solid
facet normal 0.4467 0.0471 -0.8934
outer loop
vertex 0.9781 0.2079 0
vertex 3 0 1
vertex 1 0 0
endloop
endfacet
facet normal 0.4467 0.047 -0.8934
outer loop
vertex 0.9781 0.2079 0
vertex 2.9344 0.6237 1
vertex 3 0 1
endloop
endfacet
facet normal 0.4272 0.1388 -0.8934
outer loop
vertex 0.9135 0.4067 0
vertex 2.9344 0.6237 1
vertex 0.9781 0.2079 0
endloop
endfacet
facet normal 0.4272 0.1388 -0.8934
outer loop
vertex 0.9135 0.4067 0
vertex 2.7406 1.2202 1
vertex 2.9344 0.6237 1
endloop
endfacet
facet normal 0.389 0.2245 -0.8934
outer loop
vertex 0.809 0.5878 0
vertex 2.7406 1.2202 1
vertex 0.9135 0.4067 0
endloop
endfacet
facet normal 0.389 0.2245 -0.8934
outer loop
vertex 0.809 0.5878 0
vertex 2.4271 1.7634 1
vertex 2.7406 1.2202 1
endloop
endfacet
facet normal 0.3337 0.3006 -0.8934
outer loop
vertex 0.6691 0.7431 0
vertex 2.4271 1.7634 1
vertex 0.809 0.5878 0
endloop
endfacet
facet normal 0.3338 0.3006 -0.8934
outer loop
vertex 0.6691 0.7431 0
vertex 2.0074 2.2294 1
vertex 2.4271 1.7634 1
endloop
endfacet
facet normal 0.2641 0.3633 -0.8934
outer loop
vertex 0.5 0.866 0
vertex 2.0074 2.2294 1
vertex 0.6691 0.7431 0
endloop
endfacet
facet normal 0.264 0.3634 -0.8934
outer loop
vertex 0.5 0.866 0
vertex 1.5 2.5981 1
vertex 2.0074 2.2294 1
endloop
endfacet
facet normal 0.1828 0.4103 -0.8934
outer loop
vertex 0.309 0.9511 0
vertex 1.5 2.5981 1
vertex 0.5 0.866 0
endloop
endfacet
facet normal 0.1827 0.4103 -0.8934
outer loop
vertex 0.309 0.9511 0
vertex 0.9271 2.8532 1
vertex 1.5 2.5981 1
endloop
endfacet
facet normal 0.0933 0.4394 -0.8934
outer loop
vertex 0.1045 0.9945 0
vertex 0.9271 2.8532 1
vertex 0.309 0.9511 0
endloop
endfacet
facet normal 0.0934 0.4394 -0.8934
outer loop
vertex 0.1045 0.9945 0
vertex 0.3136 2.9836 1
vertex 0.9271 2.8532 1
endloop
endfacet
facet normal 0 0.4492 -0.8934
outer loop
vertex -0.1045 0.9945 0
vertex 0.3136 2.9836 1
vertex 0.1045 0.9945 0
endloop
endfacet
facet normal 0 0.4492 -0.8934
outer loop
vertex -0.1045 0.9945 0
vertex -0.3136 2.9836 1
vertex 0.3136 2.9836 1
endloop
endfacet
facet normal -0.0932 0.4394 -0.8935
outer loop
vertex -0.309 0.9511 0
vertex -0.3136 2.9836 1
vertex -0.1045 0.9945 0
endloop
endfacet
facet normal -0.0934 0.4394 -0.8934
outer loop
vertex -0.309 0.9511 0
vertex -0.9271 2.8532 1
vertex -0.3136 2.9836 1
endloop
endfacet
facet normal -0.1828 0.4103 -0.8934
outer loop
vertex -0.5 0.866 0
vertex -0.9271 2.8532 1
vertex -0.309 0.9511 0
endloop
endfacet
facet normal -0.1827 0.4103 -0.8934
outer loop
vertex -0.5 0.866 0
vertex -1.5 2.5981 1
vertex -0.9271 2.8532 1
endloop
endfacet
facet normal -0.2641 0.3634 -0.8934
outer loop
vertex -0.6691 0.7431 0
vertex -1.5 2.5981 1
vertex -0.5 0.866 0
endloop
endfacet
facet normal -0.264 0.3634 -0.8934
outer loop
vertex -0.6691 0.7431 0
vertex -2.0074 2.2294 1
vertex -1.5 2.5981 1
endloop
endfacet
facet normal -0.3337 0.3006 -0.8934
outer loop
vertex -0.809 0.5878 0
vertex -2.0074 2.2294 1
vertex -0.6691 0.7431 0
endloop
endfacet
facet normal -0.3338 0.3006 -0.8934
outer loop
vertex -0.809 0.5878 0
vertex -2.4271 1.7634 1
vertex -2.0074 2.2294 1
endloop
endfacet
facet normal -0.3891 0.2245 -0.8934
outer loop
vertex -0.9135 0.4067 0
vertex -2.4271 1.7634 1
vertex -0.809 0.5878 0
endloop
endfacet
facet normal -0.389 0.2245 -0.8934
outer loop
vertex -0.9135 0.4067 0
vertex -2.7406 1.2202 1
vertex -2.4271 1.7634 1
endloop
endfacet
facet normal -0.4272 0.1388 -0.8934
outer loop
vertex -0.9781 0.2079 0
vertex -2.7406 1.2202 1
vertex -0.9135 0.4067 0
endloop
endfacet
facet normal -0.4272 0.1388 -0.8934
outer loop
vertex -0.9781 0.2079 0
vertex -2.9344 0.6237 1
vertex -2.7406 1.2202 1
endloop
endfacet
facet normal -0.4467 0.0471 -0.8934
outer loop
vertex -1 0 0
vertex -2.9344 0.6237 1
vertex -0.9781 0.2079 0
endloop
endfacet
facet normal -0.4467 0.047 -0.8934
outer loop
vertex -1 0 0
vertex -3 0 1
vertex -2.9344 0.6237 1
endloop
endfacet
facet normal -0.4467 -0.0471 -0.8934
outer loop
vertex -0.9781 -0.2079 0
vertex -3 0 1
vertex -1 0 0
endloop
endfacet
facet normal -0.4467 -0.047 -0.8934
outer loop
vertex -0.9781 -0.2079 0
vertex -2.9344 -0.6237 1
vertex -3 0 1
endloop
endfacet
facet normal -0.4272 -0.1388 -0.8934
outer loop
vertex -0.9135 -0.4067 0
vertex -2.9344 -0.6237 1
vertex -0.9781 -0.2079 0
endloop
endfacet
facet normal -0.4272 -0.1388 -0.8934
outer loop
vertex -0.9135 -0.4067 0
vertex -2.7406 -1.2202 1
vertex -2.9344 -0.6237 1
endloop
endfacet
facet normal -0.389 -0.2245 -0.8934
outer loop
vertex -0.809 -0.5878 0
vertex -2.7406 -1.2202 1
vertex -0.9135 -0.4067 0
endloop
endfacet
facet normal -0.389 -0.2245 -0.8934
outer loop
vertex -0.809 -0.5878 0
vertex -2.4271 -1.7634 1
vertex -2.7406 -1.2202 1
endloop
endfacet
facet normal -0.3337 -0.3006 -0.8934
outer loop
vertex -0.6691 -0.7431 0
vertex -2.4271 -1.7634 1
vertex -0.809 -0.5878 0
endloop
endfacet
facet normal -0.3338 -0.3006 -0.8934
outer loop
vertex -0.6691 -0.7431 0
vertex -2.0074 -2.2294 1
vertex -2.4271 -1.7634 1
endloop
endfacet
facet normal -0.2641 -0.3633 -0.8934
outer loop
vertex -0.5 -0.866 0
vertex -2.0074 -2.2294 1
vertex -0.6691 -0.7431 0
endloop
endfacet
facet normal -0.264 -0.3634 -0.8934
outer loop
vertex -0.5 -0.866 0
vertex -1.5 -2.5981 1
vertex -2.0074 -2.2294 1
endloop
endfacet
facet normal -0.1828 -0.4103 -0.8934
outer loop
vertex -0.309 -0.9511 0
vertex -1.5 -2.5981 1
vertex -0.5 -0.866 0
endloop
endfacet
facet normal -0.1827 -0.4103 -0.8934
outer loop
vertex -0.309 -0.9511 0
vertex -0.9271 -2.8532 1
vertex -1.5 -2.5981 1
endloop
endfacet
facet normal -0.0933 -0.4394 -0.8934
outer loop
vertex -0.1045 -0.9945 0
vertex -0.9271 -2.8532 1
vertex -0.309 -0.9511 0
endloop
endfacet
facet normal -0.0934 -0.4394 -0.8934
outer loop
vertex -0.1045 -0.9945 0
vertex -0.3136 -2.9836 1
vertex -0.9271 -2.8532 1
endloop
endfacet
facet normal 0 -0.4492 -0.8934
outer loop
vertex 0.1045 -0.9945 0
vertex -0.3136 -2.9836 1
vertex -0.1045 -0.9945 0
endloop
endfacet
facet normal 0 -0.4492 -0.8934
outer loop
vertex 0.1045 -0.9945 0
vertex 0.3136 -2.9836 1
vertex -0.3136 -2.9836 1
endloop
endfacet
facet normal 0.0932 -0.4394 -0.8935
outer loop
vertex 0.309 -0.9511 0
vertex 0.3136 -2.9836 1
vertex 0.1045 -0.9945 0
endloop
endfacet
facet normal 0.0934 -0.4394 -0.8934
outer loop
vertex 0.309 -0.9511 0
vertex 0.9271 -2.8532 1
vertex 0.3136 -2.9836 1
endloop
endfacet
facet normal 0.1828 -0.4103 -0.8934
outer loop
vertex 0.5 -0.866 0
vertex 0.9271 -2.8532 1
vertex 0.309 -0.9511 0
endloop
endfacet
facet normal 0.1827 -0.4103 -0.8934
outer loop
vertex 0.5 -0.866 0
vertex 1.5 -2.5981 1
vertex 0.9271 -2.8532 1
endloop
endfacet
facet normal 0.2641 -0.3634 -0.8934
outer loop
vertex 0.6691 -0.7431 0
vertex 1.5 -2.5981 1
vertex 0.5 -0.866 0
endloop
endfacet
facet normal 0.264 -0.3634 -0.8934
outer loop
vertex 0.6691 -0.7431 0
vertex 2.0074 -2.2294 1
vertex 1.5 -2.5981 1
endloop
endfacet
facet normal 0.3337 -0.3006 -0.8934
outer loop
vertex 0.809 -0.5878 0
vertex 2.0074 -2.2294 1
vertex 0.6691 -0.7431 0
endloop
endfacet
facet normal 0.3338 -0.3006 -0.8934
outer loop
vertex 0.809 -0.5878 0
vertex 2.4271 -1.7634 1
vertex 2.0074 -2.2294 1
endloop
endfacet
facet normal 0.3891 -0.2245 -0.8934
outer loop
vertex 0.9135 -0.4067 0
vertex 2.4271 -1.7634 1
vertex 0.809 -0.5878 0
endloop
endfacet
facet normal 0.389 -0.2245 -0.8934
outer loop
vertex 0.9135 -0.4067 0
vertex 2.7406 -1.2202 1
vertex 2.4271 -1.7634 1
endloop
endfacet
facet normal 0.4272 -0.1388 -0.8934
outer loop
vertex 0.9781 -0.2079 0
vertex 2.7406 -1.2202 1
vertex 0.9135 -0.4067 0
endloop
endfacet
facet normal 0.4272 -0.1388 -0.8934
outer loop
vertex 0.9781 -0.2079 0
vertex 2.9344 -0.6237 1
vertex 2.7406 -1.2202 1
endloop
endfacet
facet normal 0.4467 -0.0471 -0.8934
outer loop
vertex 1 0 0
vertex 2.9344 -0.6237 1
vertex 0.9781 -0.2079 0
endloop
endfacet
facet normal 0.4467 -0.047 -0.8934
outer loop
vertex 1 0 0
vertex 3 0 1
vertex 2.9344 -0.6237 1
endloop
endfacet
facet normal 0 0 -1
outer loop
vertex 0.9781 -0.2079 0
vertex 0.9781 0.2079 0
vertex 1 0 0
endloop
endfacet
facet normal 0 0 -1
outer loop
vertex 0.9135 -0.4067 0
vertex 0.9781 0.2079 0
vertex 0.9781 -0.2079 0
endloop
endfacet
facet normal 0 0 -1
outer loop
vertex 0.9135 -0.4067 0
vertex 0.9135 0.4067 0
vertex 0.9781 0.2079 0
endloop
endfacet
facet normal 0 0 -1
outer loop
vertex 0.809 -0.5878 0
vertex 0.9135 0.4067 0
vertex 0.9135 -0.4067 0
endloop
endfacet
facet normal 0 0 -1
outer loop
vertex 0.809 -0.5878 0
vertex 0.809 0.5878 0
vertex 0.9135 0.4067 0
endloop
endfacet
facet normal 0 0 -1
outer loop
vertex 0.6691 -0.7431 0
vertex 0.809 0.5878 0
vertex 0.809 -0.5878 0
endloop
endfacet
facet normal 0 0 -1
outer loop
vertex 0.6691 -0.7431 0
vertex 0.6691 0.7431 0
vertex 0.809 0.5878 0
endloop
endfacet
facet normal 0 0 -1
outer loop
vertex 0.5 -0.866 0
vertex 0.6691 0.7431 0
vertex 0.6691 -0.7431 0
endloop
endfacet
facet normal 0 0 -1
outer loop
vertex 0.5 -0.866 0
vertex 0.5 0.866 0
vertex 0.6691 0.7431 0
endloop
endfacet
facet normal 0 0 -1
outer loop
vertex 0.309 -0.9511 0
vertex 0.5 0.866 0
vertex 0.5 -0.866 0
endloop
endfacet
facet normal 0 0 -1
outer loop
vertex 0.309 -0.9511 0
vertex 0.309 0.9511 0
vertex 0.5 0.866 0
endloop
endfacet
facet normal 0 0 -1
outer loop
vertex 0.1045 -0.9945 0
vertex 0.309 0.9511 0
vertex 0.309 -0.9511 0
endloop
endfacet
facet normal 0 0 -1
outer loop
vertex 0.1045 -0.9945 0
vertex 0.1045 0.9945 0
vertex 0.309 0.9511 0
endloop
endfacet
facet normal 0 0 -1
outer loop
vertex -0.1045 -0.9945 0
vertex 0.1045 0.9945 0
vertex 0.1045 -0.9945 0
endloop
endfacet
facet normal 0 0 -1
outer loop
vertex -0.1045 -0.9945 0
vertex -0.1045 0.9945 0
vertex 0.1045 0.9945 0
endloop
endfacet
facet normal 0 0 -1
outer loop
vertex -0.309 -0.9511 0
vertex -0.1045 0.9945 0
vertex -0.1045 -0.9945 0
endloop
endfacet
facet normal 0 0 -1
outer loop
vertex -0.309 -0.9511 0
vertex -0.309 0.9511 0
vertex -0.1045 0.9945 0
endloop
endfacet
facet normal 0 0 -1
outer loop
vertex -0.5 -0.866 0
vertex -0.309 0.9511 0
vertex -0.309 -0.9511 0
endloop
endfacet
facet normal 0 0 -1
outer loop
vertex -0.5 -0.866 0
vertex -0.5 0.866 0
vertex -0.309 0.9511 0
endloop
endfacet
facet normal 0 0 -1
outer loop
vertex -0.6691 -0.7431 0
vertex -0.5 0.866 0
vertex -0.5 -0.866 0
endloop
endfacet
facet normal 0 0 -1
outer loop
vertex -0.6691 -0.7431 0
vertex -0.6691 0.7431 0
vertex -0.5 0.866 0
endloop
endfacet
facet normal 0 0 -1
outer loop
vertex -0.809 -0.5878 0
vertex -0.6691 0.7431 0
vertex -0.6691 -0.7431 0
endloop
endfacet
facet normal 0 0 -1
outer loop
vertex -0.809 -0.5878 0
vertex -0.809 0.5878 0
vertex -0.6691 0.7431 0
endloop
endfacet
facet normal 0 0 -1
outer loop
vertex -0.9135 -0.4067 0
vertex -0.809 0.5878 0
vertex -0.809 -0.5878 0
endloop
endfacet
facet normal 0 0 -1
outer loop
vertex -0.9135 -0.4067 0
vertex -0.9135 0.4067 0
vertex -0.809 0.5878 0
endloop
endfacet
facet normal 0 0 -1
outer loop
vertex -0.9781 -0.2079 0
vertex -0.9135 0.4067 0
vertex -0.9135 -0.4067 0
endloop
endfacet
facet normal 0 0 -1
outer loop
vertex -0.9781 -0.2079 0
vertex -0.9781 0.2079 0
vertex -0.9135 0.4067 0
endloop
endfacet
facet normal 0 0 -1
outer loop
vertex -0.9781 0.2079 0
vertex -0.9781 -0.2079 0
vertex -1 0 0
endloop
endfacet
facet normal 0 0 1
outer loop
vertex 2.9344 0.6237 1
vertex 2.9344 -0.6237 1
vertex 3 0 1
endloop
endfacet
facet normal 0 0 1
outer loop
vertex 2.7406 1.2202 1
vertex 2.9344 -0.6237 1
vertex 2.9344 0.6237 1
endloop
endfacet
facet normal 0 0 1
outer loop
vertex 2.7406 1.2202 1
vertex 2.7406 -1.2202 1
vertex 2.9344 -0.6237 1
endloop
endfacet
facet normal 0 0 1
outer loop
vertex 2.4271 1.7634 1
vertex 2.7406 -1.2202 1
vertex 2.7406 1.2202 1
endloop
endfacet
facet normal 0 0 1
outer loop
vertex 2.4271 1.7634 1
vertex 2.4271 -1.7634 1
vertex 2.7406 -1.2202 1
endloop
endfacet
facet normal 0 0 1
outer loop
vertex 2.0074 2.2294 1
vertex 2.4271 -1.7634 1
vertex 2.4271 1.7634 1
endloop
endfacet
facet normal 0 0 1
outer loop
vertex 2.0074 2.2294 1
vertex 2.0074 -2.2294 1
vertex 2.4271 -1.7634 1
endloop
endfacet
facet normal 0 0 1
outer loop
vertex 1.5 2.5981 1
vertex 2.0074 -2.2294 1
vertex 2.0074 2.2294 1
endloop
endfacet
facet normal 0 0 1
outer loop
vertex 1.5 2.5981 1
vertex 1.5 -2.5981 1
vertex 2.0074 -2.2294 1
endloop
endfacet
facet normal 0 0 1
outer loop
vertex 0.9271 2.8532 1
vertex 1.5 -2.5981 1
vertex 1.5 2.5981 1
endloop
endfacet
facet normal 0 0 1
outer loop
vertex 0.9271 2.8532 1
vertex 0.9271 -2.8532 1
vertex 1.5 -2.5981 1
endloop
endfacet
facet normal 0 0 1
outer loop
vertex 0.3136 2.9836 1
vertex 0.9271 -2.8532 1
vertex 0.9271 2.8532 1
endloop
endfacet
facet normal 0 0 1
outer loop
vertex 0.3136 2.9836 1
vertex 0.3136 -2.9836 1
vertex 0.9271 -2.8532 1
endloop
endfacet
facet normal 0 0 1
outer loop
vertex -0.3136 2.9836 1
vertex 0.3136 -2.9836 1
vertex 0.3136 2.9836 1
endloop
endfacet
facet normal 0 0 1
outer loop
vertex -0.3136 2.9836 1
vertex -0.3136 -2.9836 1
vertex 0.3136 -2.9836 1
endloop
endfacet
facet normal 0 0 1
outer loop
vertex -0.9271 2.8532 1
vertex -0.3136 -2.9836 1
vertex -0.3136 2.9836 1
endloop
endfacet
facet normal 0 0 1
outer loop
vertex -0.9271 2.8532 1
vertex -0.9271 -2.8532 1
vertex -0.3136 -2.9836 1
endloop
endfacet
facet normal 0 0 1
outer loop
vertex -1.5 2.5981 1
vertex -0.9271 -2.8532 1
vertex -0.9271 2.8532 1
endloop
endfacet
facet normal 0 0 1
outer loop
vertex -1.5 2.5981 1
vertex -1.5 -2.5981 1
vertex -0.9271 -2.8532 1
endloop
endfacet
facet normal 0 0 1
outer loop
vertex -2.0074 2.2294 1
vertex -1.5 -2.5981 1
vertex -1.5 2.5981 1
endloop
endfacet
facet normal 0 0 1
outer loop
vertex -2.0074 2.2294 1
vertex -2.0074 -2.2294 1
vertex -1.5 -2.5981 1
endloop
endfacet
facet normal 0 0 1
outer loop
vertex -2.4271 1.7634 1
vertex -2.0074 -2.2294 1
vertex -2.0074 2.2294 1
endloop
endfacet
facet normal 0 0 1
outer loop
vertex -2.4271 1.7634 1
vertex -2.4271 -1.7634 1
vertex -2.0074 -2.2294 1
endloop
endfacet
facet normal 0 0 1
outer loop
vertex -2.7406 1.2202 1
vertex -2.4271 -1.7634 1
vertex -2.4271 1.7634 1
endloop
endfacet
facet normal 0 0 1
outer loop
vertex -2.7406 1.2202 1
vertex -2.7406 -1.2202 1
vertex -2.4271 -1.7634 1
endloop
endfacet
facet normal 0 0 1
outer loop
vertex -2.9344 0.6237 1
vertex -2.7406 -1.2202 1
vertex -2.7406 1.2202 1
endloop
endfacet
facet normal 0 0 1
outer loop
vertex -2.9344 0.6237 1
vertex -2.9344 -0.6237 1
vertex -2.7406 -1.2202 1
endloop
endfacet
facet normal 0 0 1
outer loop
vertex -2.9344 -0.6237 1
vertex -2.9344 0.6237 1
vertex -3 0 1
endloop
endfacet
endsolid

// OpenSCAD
/*
 * OpenSCAD Workshop Examples
 * Copyright (c) 2013 Anar Software LLC. < http://anars.com >
 *
 * This program is free software: you can redistribute it and/or modify it under
 * the terms of the GNU General Public License as published by the Free Software
 * Foundation, either version 3 of the License, or (at your option) any later
 * version.
 *
 * This program is distributed in the hope that it will be useful, but WITHOUT
 * ANY WARRANTY; without even the implied warranty of MERCHANTABILITY or FITNESS
 * FOR A PARTICULAR PURPOSE. See the GNU General Public License for more details.
 *
 * You should have received a copy of the GNU General Public License along with
 * this program. If not, see < http://www.gnu.org/licenses/ >
 *
 */
/*

Creates a cone with top end radius is 3 unit radius, bottom end radius 1 unit and 1 unit height.

Parameters :

	cylinder(r2 = x);

*/

$fs = 0;

cylinder(r2 = 3);
